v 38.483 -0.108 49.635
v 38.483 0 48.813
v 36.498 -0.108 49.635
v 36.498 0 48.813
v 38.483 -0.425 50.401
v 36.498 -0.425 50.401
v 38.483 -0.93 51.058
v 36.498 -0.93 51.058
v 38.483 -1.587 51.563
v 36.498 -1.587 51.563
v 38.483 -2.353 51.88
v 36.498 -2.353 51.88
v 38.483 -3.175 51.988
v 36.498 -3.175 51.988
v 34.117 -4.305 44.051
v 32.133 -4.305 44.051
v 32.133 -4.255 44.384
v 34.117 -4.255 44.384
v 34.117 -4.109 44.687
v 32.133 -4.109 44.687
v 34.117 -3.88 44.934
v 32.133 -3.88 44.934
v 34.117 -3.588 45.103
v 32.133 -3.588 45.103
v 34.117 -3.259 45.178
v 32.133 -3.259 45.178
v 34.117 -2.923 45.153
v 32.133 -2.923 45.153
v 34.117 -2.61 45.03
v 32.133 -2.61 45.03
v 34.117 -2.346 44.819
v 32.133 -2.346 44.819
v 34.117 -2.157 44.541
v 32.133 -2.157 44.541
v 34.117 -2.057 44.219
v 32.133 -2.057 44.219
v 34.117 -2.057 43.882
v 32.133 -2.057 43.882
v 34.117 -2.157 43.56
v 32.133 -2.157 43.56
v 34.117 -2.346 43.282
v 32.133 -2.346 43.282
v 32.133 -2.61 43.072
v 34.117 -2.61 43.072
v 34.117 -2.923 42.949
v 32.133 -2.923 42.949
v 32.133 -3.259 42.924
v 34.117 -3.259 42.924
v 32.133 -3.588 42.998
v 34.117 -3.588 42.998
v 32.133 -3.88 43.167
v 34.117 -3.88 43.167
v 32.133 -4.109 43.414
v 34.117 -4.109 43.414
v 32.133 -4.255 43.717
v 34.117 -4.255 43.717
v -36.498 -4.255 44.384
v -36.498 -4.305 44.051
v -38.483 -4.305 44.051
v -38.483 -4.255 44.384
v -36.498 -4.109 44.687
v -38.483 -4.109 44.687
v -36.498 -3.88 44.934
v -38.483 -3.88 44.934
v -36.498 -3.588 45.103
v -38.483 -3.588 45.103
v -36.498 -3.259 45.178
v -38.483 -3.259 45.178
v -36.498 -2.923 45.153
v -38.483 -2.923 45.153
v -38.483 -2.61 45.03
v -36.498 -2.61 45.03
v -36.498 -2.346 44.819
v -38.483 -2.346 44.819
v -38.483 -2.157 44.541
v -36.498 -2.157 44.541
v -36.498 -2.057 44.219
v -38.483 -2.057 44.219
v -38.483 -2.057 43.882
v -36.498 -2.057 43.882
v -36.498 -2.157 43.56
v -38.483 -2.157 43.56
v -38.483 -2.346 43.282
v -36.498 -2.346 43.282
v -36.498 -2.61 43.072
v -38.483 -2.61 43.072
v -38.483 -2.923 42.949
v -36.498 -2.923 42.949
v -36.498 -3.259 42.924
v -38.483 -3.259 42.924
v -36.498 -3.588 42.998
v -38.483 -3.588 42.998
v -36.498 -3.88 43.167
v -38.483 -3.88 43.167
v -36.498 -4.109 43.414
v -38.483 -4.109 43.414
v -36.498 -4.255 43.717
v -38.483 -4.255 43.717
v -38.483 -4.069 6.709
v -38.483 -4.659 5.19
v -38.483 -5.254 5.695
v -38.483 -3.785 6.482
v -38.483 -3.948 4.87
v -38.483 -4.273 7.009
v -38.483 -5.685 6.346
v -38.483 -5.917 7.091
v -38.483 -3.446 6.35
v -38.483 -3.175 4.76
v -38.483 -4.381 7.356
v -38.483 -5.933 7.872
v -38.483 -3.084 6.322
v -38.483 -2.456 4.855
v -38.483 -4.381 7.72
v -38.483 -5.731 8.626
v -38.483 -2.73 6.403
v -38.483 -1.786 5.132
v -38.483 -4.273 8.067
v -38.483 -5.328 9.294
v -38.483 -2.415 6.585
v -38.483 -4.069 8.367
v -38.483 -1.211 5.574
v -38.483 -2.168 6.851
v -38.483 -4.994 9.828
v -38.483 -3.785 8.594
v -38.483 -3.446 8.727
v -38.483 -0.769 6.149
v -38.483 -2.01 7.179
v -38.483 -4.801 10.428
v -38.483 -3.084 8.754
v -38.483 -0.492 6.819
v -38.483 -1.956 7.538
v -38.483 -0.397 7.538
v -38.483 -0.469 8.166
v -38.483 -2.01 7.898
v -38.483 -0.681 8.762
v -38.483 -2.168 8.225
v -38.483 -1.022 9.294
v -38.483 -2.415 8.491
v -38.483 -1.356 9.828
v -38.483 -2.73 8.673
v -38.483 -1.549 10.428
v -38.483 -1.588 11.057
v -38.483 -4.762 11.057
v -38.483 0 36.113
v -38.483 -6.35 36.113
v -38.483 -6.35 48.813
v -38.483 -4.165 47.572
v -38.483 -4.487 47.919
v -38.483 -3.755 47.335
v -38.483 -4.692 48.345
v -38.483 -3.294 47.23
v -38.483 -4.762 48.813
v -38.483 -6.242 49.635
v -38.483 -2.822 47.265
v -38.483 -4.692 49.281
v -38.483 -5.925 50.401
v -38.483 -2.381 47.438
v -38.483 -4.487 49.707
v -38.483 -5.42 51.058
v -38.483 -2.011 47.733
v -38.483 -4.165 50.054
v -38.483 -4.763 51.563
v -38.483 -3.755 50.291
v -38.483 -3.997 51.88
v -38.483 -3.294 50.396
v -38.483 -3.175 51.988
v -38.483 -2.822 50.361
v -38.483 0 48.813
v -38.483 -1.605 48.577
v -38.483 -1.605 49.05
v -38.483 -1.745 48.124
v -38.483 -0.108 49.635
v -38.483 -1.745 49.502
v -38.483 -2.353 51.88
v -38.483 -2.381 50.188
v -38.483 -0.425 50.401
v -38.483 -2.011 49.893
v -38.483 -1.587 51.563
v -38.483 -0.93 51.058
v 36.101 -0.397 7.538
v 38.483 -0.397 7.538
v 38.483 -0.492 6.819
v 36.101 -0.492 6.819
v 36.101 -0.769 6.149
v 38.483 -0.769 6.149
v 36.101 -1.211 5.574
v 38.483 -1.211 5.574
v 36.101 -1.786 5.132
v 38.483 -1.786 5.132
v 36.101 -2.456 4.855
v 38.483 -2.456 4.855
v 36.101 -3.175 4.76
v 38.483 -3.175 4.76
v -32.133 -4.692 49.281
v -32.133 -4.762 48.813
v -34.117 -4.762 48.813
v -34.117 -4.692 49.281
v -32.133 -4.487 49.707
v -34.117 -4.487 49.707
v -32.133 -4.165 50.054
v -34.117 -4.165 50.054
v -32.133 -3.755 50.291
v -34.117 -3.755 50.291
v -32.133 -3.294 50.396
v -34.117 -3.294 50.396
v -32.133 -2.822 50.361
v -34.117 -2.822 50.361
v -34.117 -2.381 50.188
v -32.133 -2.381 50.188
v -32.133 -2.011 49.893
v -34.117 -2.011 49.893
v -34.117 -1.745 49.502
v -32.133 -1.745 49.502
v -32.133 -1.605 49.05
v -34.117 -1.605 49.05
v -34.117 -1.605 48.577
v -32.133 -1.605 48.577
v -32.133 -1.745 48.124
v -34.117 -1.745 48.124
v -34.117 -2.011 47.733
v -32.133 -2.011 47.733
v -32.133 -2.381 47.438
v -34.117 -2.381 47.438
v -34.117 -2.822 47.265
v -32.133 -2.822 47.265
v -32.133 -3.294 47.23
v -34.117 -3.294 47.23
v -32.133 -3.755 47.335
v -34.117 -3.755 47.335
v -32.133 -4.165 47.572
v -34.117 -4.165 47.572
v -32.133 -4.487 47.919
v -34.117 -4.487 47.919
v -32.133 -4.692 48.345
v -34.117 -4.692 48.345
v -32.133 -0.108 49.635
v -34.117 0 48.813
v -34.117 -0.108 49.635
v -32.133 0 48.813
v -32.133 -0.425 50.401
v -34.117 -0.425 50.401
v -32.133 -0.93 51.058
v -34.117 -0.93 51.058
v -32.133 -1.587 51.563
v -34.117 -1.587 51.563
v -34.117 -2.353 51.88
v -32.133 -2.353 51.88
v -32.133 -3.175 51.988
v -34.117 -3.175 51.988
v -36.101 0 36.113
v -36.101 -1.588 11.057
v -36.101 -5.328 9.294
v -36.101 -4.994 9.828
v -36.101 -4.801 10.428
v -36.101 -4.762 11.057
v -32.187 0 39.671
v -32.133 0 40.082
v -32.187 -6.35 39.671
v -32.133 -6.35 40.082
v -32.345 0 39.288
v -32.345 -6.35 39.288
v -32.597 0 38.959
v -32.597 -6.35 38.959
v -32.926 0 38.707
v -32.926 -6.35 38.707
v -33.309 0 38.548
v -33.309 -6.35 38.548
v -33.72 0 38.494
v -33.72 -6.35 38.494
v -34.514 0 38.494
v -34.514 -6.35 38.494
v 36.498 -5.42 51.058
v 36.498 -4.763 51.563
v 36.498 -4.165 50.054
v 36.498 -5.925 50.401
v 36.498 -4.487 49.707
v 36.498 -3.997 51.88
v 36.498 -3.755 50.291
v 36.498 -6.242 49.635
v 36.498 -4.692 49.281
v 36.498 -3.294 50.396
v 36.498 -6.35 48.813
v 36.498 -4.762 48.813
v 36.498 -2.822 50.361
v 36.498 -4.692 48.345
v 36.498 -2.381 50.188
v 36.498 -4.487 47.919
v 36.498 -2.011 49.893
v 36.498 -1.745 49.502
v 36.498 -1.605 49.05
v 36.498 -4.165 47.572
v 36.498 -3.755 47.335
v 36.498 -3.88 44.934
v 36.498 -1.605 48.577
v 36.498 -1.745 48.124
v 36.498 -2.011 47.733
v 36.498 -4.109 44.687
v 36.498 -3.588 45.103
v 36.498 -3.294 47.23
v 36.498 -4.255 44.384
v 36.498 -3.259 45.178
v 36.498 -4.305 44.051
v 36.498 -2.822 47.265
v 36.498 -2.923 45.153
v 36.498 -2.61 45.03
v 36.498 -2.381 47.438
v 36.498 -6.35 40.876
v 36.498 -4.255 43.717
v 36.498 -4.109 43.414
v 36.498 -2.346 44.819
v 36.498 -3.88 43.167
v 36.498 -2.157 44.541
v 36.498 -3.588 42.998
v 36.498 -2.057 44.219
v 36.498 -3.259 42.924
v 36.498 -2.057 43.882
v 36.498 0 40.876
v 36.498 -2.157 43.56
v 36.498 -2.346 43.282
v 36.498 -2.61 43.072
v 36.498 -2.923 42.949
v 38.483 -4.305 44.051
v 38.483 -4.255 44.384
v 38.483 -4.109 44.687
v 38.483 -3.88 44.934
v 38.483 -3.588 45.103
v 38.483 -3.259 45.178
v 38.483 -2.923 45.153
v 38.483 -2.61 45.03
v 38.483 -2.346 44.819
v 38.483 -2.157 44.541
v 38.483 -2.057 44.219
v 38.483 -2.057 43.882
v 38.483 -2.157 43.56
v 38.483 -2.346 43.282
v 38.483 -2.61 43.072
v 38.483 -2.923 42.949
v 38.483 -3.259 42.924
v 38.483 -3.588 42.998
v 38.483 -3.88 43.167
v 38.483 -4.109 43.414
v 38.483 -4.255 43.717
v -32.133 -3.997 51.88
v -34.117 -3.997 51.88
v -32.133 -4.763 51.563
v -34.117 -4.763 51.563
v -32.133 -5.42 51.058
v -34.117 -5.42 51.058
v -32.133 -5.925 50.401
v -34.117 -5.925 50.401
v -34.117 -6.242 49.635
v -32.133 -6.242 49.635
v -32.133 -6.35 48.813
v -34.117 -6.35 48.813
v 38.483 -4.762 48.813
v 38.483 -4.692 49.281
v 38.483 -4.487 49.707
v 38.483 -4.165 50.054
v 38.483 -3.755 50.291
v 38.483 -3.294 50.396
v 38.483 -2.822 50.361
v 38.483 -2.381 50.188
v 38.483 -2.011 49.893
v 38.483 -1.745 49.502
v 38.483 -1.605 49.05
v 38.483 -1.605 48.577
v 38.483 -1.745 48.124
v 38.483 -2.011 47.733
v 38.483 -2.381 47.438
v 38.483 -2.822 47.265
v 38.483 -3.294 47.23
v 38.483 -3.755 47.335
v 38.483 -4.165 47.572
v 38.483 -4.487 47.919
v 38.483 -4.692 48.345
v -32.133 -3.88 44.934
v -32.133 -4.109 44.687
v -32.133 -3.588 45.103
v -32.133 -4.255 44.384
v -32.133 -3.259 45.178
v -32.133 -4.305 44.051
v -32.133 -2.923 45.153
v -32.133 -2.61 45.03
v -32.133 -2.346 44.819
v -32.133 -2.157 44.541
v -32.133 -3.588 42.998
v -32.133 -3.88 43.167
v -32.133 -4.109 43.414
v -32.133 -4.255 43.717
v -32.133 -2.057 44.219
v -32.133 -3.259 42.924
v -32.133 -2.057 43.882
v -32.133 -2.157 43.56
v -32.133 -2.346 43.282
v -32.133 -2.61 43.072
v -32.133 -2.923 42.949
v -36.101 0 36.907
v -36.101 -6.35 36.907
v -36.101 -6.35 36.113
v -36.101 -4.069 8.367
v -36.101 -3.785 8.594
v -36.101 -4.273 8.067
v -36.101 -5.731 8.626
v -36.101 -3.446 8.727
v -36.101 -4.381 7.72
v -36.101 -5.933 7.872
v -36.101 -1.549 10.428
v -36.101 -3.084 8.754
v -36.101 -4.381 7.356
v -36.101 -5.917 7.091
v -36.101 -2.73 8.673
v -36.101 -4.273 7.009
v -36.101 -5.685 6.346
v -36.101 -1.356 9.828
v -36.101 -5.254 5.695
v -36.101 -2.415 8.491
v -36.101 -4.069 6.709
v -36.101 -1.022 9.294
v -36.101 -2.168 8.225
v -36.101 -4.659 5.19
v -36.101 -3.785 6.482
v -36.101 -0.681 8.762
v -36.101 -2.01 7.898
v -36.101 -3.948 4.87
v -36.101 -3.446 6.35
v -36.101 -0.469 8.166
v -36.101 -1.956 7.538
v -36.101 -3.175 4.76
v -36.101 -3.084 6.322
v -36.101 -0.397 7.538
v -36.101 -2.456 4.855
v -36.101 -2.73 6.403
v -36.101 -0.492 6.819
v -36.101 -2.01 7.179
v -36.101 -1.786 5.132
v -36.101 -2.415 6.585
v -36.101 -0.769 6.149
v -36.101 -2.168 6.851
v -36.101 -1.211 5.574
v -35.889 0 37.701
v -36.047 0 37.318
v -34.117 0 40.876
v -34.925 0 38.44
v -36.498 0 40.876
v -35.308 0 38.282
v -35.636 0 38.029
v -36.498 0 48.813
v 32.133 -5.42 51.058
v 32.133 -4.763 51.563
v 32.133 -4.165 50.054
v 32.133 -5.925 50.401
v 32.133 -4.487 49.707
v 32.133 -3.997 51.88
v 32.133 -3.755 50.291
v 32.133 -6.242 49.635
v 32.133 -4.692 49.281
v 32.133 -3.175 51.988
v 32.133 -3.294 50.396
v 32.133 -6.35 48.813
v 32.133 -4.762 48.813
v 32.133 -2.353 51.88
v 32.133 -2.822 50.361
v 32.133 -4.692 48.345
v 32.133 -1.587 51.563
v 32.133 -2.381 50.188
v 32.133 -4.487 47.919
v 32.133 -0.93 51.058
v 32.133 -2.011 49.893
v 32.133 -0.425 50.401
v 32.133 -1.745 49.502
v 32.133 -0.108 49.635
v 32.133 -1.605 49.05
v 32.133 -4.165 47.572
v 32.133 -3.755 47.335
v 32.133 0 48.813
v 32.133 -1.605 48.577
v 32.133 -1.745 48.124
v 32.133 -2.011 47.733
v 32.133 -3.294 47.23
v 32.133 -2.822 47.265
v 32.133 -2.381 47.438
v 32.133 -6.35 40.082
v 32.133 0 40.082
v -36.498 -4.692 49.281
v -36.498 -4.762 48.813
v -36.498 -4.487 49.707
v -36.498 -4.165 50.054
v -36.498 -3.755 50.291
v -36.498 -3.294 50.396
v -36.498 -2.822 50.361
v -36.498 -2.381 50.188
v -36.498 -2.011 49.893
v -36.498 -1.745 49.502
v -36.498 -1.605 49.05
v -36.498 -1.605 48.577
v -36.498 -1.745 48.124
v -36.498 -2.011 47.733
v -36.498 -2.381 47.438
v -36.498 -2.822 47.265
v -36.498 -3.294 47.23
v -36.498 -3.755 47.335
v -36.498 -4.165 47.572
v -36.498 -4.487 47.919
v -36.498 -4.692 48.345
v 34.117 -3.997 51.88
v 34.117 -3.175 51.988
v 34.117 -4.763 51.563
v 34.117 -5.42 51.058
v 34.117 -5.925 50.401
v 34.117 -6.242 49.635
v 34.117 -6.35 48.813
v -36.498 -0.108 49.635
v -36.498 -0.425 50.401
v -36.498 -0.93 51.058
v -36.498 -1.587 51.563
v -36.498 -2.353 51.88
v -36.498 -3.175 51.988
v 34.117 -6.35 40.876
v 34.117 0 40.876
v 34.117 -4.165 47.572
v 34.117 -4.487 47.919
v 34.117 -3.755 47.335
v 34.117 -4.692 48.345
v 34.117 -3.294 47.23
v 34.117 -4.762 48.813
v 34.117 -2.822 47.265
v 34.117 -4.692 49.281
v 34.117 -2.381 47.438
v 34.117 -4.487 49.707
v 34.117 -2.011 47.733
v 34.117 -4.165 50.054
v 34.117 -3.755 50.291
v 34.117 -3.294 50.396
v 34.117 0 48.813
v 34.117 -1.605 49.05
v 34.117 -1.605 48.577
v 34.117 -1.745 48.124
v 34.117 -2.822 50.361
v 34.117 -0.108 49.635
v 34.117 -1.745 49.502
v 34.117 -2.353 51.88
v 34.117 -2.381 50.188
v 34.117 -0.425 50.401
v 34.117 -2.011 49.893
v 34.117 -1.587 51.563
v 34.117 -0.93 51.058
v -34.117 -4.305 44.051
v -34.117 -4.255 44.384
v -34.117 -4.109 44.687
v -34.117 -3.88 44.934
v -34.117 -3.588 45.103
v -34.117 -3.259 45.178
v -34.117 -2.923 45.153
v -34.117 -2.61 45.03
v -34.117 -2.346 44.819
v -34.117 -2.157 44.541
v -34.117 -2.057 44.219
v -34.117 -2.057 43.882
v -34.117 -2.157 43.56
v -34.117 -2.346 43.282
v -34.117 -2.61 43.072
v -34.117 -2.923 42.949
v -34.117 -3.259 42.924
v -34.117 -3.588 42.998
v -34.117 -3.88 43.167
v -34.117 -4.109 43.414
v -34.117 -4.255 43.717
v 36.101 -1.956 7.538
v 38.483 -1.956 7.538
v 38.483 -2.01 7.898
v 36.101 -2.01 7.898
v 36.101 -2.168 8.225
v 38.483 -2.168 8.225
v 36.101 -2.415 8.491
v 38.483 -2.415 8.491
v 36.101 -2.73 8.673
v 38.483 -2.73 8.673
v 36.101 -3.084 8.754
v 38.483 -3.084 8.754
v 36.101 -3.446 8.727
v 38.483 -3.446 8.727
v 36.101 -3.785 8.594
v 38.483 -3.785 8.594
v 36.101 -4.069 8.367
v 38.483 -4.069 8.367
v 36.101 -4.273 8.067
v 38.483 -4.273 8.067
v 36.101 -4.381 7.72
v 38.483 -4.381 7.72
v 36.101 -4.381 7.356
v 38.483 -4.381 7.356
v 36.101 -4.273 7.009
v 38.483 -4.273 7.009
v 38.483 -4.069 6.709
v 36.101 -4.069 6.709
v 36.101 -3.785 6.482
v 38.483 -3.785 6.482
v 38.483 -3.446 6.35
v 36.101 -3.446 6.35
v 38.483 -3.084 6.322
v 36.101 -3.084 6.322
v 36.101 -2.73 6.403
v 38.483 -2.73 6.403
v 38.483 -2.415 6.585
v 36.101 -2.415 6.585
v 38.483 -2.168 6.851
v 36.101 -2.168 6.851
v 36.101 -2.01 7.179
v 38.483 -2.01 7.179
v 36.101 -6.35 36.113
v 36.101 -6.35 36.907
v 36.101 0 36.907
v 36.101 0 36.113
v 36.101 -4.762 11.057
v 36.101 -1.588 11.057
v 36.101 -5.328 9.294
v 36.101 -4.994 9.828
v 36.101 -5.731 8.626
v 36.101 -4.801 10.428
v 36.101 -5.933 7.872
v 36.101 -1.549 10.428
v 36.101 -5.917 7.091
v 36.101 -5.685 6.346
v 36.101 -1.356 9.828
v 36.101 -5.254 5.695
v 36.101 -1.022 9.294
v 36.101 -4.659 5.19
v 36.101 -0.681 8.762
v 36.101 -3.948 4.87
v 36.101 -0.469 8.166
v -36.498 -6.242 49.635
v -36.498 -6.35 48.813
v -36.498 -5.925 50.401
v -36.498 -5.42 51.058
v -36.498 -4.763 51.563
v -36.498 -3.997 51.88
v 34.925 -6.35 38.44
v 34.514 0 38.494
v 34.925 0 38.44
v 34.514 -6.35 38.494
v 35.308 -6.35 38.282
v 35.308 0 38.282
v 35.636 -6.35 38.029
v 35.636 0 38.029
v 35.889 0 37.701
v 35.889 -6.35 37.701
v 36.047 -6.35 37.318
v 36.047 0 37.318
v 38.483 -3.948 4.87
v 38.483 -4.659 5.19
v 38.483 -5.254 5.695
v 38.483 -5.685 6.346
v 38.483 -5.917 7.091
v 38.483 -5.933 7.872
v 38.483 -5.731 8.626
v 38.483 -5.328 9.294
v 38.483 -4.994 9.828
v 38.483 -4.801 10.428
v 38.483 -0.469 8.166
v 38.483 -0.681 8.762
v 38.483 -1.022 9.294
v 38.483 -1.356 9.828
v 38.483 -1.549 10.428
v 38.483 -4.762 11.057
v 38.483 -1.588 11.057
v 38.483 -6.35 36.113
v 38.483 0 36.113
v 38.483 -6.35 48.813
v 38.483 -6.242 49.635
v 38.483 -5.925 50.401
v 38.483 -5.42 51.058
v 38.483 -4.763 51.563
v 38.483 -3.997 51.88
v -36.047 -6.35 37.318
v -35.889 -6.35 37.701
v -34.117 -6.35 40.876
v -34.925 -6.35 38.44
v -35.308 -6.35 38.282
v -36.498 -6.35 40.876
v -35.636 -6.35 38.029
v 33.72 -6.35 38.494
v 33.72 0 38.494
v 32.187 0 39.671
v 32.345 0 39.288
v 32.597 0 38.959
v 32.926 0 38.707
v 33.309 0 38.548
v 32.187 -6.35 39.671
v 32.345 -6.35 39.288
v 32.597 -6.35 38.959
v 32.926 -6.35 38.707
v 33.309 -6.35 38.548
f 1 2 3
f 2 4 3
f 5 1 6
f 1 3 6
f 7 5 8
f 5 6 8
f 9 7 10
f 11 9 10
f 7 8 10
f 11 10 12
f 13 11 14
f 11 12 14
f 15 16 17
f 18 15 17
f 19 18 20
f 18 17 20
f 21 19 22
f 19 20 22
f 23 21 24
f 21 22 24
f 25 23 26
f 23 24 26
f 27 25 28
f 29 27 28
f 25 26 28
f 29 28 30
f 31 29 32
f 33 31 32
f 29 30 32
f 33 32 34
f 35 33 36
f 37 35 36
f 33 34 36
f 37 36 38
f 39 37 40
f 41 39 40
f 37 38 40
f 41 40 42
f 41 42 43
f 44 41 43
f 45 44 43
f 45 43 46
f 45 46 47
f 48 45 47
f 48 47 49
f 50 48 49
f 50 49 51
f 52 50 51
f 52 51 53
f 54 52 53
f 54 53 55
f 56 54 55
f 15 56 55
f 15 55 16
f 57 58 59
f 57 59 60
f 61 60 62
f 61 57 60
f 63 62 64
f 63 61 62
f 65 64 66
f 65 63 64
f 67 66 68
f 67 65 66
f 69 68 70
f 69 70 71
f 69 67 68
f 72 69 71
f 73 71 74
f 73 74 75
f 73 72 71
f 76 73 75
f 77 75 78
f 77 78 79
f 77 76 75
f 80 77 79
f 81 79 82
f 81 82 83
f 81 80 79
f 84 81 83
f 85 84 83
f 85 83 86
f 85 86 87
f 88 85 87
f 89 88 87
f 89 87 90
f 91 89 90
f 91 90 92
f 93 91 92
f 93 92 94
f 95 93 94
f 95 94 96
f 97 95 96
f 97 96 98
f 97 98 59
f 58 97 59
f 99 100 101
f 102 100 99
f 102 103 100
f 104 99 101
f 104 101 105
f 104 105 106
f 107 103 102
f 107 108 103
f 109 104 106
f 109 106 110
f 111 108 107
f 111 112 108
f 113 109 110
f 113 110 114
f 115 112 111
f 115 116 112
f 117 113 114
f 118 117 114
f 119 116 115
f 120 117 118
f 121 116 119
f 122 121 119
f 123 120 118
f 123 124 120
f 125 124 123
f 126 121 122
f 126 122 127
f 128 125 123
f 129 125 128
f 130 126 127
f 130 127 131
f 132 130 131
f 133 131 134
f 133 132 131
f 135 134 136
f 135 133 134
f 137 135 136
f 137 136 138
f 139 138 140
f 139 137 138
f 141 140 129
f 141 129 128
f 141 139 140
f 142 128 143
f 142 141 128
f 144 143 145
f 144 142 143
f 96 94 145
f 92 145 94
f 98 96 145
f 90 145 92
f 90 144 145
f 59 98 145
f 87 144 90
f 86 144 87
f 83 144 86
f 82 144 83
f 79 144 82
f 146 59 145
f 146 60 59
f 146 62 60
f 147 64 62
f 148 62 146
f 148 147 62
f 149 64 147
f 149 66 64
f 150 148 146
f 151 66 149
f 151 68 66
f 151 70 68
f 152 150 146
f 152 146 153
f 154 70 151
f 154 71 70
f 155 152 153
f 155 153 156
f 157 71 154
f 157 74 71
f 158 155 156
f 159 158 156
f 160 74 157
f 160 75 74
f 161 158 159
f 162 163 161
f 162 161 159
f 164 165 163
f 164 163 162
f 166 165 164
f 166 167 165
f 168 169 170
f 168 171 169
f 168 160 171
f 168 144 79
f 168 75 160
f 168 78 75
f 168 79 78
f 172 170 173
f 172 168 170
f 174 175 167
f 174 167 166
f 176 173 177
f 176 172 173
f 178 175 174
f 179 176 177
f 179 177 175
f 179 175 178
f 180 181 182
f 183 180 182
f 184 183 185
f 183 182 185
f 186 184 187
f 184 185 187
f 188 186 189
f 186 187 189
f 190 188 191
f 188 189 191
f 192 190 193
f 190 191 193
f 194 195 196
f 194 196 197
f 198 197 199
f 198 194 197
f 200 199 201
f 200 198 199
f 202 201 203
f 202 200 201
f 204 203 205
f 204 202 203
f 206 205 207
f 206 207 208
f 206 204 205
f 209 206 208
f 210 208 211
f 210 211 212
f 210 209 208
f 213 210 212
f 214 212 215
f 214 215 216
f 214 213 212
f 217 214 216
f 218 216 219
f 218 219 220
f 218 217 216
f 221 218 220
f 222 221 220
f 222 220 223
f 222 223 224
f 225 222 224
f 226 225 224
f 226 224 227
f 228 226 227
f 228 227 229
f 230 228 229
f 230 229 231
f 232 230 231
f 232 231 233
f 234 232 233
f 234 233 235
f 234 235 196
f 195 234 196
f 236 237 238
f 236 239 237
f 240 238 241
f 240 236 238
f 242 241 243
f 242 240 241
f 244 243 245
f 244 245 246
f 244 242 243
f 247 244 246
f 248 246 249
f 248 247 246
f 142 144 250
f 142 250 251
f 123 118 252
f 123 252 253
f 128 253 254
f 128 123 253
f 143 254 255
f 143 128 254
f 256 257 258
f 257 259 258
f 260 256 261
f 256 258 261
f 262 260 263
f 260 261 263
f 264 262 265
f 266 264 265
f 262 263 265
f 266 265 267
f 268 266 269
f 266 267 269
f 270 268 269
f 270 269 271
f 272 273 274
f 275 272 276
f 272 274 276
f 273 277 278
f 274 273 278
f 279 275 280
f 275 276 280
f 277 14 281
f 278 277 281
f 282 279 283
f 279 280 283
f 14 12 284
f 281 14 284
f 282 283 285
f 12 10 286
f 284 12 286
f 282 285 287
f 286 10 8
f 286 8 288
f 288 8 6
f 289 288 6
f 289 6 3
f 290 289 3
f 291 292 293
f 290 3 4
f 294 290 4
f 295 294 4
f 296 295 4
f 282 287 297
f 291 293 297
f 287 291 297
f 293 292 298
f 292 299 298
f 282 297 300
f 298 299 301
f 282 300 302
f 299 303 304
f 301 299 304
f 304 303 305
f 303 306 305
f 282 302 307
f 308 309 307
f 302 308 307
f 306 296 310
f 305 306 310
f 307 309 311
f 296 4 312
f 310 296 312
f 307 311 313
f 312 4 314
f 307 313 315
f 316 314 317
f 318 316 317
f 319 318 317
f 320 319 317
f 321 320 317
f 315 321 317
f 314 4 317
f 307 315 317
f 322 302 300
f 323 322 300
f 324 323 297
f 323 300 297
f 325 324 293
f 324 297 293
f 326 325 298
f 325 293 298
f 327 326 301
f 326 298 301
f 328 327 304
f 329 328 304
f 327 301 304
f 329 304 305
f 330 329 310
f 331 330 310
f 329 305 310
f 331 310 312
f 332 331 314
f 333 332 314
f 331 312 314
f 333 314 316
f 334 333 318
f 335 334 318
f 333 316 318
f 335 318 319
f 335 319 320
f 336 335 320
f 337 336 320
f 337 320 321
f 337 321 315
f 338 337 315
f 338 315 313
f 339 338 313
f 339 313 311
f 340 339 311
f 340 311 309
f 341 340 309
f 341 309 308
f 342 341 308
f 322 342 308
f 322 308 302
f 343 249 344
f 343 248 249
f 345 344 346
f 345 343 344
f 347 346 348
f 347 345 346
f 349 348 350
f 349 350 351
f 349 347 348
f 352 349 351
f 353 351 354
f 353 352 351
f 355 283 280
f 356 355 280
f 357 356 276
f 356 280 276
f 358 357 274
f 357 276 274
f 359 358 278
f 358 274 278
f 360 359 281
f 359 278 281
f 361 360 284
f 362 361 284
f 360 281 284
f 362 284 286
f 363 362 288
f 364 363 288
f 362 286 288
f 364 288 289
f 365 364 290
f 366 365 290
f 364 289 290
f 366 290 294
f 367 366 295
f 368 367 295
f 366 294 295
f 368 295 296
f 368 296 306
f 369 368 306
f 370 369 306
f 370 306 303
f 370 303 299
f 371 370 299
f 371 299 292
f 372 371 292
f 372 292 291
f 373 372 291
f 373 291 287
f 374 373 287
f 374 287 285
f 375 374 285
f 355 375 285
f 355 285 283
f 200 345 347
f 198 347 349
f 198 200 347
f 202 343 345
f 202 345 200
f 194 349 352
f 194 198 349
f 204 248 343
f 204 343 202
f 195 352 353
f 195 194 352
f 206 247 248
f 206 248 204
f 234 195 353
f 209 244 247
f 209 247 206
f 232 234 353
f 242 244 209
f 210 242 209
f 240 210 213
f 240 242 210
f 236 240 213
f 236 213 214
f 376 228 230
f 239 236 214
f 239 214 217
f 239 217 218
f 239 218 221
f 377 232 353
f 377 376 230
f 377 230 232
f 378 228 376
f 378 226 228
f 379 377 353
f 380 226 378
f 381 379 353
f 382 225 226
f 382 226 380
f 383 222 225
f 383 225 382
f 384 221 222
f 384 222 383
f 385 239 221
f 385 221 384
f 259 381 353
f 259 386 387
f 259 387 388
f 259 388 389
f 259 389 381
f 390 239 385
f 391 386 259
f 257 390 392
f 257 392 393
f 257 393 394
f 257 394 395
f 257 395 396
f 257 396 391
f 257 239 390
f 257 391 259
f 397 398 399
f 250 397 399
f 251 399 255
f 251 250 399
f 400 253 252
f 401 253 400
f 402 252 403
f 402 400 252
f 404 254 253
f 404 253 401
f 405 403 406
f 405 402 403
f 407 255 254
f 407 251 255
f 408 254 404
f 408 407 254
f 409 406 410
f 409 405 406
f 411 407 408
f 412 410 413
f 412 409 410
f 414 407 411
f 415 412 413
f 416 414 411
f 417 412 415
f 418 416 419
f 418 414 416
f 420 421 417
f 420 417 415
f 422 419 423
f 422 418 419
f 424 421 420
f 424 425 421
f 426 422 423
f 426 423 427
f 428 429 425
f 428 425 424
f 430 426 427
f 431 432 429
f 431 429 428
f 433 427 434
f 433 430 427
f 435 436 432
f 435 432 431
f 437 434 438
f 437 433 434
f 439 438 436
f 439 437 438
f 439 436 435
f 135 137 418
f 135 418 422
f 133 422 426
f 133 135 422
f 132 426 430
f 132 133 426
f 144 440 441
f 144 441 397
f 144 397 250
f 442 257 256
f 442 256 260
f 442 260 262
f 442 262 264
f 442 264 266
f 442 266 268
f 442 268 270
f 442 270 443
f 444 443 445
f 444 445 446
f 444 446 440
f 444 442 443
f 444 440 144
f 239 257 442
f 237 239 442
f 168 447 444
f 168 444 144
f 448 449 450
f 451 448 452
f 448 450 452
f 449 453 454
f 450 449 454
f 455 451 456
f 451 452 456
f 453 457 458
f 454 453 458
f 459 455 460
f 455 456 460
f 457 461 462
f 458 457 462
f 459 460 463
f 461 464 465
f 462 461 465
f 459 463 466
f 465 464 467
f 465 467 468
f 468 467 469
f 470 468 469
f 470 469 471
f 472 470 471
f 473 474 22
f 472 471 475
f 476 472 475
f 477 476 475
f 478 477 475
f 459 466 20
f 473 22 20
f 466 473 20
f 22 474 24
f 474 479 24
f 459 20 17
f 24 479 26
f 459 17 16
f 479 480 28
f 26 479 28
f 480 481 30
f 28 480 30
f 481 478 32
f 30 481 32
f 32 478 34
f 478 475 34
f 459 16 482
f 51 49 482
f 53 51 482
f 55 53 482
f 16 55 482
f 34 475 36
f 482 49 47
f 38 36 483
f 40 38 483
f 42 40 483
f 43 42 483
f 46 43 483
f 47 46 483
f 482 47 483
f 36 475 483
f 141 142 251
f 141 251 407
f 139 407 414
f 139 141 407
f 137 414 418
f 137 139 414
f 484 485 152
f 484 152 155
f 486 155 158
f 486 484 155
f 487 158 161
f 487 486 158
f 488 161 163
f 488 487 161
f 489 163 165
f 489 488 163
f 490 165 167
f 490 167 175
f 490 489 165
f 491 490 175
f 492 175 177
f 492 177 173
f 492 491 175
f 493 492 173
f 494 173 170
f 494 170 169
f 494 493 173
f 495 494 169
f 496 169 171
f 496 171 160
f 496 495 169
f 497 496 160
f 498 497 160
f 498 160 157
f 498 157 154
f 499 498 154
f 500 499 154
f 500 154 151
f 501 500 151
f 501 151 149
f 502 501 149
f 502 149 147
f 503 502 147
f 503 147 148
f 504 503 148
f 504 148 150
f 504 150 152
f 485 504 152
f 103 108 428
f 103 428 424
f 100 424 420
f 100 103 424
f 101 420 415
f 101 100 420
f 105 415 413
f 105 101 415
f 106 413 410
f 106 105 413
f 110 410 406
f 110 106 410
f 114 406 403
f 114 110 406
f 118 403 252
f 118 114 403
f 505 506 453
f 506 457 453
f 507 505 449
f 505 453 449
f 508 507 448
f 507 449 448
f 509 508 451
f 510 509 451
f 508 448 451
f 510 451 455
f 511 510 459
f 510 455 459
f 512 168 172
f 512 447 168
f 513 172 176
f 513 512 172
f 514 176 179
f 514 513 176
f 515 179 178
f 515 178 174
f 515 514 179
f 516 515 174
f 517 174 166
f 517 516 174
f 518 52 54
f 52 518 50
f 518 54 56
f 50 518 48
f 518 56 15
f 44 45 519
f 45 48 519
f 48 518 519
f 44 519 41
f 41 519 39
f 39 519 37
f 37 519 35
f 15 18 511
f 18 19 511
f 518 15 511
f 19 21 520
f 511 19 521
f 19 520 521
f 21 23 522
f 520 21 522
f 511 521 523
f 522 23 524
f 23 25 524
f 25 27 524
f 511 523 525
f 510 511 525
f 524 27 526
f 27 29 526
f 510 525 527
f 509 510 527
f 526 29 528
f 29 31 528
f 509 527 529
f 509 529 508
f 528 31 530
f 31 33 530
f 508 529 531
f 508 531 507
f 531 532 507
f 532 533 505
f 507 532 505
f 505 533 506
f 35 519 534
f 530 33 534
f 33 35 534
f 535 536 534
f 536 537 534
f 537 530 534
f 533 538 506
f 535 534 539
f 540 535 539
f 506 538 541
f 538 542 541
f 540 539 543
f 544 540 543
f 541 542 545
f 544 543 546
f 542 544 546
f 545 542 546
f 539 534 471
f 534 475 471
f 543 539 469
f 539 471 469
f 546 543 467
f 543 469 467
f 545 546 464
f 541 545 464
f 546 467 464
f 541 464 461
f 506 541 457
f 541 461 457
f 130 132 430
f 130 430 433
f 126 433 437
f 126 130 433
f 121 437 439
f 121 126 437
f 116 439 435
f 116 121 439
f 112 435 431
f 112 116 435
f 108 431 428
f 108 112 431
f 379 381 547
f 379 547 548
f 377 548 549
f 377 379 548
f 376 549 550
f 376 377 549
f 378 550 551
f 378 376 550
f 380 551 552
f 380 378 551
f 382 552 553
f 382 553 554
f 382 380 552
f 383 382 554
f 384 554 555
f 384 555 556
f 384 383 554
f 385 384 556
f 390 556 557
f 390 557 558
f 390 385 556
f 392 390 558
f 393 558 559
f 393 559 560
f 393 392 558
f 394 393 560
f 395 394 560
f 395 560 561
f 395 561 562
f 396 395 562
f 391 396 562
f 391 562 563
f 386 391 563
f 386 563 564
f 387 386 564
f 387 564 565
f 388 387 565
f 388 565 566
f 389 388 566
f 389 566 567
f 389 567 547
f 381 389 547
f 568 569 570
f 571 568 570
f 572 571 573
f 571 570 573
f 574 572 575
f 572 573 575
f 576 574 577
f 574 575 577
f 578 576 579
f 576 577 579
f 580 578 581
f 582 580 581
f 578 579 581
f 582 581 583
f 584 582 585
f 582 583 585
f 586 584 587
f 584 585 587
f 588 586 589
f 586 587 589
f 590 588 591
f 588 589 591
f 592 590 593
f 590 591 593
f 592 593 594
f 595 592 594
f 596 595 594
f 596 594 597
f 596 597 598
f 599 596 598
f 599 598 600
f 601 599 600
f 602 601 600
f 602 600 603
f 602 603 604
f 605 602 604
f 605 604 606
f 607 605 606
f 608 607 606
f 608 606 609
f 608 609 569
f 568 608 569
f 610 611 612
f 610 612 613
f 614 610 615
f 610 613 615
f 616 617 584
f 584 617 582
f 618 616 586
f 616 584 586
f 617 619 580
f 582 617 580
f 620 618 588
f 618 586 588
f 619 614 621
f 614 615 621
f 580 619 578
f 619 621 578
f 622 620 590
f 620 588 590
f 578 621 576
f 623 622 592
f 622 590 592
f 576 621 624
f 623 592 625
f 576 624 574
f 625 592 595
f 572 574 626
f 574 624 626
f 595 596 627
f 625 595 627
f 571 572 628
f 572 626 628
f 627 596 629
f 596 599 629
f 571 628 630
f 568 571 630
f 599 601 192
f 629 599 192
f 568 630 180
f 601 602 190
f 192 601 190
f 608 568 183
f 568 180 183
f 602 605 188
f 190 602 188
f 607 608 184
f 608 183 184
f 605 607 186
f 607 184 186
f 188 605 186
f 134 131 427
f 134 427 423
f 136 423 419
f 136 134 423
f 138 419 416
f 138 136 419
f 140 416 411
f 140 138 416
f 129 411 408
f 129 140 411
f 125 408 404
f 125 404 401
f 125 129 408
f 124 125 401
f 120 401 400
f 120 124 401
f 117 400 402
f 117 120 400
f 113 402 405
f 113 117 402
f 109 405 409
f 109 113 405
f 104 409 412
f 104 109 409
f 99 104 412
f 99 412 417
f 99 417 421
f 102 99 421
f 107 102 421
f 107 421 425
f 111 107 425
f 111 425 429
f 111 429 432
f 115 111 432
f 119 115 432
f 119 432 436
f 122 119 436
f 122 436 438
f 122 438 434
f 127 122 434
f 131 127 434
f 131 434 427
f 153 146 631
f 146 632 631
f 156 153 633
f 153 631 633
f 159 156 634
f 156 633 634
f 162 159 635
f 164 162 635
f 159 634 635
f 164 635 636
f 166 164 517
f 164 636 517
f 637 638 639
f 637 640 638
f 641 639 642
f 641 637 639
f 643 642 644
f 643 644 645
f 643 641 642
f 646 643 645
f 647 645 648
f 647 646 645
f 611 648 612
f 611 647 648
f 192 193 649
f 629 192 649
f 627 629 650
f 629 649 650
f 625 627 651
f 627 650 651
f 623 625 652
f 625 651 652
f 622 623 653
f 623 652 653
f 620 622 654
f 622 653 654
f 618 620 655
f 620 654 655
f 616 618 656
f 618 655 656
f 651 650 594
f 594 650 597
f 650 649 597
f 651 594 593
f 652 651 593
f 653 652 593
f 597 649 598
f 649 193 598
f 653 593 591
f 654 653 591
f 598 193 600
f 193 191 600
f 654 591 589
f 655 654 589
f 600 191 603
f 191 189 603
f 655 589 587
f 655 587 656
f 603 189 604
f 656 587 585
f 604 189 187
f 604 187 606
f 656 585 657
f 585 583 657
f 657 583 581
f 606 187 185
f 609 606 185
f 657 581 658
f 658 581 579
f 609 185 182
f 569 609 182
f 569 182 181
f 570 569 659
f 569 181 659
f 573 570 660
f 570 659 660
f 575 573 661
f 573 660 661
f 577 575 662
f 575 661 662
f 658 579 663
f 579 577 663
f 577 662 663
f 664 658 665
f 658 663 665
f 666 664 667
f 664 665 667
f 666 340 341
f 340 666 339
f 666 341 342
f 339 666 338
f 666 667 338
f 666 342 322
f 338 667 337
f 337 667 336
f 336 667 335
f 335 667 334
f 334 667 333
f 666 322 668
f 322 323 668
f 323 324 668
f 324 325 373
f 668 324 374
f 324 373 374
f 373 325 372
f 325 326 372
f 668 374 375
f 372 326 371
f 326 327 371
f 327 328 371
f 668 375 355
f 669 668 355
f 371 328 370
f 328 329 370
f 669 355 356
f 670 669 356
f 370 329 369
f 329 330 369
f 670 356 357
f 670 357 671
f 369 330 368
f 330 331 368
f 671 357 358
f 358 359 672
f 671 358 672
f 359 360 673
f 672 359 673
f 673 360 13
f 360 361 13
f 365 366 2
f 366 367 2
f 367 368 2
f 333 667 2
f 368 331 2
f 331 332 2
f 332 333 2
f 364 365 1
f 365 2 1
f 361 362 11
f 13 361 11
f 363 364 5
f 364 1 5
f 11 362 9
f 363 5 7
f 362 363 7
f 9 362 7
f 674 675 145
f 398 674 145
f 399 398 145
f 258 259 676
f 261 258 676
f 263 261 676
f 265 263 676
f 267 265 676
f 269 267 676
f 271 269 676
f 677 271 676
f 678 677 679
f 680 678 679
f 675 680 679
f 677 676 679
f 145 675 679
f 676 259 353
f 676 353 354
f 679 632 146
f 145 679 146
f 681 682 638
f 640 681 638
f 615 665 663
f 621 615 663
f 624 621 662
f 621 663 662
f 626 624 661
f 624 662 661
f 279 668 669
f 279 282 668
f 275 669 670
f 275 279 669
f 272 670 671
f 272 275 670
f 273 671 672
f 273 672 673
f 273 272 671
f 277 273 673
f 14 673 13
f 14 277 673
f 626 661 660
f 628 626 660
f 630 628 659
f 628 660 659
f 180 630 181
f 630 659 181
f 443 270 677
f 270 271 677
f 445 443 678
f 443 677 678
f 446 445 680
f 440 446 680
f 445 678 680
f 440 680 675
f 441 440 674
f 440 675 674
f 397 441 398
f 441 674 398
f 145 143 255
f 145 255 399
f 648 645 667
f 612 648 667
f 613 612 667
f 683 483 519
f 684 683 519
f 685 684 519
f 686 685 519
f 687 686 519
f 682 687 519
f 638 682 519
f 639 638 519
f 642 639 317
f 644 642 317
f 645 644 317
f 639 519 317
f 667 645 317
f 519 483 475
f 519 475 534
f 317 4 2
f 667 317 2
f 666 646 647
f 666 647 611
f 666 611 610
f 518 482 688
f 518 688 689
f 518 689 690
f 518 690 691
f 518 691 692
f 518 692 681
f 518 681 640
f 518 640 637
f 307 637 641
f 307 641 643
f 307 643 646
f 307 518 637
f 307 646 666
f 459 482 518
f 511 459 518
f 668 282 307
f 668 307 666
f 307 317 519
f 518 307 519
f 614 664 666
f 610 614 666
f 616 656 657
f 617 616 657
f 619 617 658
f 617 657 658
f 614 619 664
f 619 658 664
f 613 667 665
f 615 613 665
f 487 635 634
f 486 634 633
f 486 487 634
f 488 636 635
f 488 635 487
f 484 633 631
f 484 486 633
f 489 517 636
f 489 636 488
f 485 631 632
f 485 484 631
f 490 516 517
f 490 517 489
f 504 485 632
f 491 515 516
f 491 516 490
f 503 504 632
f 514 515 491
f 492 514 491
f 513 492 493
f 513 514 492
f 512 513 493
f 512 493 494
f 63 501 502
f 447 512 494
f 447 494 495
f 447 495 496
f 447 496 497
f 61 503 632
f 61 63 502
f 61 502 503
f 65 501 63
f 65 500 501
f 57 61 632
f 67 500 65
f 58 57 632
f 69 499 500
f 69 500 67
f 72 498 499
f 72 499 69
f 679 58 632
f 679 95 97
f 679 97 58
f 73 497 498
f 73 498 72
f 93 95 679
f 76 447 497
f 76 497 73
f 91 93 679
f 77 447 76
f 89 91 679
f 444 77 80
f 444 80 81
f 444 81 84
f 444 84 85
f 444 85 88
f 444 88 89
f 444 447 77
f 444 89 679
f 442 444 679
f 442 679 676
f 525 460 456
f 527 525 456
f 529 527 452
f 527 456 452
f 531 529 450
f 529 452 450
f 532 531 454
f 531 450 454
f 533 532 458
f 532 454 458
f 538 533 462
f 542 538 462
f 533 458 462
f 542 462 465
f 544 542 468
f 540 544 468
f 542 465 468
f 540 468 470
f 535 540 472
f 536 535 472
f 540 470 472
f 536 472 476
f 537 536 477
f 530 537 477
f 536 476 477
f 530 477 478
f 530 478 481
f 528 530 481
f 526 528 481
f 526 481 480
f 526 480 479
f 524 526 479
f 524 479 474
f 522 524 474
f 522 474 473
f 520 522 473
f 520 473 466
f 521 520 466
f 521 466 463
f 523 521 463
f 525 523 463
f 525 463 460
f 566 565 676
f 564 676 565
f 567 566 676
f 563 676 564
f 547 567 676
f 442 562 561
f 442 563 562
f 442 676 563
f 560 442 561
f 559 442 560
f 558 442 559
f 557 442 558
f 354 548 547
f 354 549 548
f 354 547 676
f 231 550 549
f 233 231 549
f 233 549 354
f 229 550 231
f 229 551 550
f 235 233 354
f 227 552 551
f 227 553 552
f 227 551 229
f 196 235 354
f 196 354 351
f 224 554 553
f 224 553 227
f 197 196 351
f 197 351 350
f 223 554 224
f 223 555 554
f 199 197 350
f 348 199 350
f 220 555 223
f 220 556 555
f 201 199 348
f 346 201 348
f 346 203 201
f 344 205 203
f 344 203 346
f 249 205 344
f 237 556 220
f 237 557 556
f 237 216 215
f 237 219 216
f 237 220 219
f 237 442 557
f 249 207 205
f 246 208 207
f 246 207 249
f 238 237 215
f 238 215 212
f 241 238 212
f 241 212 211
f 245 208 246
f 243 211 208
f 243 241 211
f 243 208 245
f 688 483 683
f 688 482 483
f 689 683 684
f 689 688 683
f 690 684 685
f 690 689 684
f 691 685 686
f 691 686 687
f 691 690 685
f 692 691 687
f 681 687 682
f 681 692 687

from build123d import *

# Parameters (mm, degrees)
F1_DEPTH = 6.35
F2_R     = 1.5875
F3_R     = 3.17499
F5_D     = 3.175
F7_D     = 2.2606
F8_R     = 1.2192
F9_DEPTH = 25.4


# Not quite as in the source:
# - a fillet or chamfer is up to 0.001 mm smaller than in the source, because OpenCascade refuses the exact size


with BuildPart() as f1:
    # F0 (on Front) → F1 (new body)
    with BuildSketch(Plane.XZ):
        Polygon((36.1012686809, 4.7600296621), (38.4825186809, 4.7600296621), (38.4825186809, 51.9881546621), (36.4981436809, 51.9881546621), (36.4981436809, 40.8756546621), (34.1168936809, 40.8756546621), (34.1168936809, 51.9881546621), (32.1325186809, 51.9881546621), (32.1325186809, 38.4944046621), (36.1012686809, 38.4944046621), align=None)
    extrude(amount=F1_DEPTH)

    # F2
    f2_edges = [f1.edges().sort_by_distance(p)[0] for p in [
        (36.101269, -3.175, 38.494405),
        (32.132519, -3.175, 38.494405),
    ]]
    fillet(f2_edges, radius=F2_R)

    # F3 (radius 3.175 in the source; OpenCascade refuses exactly that, so slightly less here)
    f3_edges = [f1.edges().sort_by_distance(p)[0] for p in [
        (33.124706, -6.35, 51.988155),
        (33.124706, 0, 51.988155),
        (37.490331, 0, 51.988155),
        (37.490331, -6.35, 51.988155),
    ]]
    fillet(f3_edges, radius=F3_R)

    # F5 (through all)
    with Locations(Plane.YZ.offset(38.4825186809)):
        with Locations((-3.175, 48.8131546621)):
            Hole(F5_D / 2)

    # F7 (through all)
    with Locations(Plane.YZ.offset(38.4825186809)):
        with Locations((-3.175, 44.0506546621)):
            Hole(F7_D / 2)

    # F8 (on face) → F9 (cut)
    with BuildSketch(Plane.YZ.offset(38.4825186809)):
        Polygon((-6.35, 11.0568078235), (-4.7625, 11.0568078235), (-6.35, 36.1131546621), align=None)
        with BuildLine():
            Line((-6.35, 4.7600296621), (-3.175, 4.7600296621))
            ThreePointArc((-3.175, 4.7600296621), (-5.684534213, 6.3464262746), (-5.3280227481, 9.2938515499))
            ThreePointArc((-5.3280227481, 9.2938515499), (-4.8786206586, 10.1218745235), (-4.7625, 11.0568078235))
            Line((-4.7625, 11.0568078235), (-6.35, 11.0568078235))
            Line((-6.35, 11.0568078235), (-6.35, 4.7600296621))
        make_face()
        with Locations((-3.175, 7.5381546621)):
            Circle(F8_R)
        with BuildLine():
            ThreePointArc((-1.0219772519, 9.2938515499), (-0.5578121163, 8.4699840975), (-0.396875, 7.5381546621))
            ThreePointArc((-0.396875, 7.5381546621), (-1.2105689735, 5.5737236356), (-3.175, 4.7600296621))
            Line((-3.175, 4.7600296621), (0, 4.7600296621))
            Line((0, 4.7600296621), (0, 11.0568078235))
            Line((0, 11.0568078235), (-1.5875, 11.0568078235))
            ThreePointArc((-1.5875, 11.0568078235), (-1.4713793414, 10.1218745235), (-1.0219772519, 9.2938515499))
        make_face()
        Polygon((0, 36.1131546621), (-1.5875, 11.0568078235), (0, 11.0568078235), align=None)
    extrude(amount=-F9_DEPTH, mode=Mode.SUBTRACT)


with BuildPart() as f11_1:
    # F11: instance of F1
    add(f1.part.mirror(Plane.YZ))


solid = Compound([f1.part, f11_1.part])
